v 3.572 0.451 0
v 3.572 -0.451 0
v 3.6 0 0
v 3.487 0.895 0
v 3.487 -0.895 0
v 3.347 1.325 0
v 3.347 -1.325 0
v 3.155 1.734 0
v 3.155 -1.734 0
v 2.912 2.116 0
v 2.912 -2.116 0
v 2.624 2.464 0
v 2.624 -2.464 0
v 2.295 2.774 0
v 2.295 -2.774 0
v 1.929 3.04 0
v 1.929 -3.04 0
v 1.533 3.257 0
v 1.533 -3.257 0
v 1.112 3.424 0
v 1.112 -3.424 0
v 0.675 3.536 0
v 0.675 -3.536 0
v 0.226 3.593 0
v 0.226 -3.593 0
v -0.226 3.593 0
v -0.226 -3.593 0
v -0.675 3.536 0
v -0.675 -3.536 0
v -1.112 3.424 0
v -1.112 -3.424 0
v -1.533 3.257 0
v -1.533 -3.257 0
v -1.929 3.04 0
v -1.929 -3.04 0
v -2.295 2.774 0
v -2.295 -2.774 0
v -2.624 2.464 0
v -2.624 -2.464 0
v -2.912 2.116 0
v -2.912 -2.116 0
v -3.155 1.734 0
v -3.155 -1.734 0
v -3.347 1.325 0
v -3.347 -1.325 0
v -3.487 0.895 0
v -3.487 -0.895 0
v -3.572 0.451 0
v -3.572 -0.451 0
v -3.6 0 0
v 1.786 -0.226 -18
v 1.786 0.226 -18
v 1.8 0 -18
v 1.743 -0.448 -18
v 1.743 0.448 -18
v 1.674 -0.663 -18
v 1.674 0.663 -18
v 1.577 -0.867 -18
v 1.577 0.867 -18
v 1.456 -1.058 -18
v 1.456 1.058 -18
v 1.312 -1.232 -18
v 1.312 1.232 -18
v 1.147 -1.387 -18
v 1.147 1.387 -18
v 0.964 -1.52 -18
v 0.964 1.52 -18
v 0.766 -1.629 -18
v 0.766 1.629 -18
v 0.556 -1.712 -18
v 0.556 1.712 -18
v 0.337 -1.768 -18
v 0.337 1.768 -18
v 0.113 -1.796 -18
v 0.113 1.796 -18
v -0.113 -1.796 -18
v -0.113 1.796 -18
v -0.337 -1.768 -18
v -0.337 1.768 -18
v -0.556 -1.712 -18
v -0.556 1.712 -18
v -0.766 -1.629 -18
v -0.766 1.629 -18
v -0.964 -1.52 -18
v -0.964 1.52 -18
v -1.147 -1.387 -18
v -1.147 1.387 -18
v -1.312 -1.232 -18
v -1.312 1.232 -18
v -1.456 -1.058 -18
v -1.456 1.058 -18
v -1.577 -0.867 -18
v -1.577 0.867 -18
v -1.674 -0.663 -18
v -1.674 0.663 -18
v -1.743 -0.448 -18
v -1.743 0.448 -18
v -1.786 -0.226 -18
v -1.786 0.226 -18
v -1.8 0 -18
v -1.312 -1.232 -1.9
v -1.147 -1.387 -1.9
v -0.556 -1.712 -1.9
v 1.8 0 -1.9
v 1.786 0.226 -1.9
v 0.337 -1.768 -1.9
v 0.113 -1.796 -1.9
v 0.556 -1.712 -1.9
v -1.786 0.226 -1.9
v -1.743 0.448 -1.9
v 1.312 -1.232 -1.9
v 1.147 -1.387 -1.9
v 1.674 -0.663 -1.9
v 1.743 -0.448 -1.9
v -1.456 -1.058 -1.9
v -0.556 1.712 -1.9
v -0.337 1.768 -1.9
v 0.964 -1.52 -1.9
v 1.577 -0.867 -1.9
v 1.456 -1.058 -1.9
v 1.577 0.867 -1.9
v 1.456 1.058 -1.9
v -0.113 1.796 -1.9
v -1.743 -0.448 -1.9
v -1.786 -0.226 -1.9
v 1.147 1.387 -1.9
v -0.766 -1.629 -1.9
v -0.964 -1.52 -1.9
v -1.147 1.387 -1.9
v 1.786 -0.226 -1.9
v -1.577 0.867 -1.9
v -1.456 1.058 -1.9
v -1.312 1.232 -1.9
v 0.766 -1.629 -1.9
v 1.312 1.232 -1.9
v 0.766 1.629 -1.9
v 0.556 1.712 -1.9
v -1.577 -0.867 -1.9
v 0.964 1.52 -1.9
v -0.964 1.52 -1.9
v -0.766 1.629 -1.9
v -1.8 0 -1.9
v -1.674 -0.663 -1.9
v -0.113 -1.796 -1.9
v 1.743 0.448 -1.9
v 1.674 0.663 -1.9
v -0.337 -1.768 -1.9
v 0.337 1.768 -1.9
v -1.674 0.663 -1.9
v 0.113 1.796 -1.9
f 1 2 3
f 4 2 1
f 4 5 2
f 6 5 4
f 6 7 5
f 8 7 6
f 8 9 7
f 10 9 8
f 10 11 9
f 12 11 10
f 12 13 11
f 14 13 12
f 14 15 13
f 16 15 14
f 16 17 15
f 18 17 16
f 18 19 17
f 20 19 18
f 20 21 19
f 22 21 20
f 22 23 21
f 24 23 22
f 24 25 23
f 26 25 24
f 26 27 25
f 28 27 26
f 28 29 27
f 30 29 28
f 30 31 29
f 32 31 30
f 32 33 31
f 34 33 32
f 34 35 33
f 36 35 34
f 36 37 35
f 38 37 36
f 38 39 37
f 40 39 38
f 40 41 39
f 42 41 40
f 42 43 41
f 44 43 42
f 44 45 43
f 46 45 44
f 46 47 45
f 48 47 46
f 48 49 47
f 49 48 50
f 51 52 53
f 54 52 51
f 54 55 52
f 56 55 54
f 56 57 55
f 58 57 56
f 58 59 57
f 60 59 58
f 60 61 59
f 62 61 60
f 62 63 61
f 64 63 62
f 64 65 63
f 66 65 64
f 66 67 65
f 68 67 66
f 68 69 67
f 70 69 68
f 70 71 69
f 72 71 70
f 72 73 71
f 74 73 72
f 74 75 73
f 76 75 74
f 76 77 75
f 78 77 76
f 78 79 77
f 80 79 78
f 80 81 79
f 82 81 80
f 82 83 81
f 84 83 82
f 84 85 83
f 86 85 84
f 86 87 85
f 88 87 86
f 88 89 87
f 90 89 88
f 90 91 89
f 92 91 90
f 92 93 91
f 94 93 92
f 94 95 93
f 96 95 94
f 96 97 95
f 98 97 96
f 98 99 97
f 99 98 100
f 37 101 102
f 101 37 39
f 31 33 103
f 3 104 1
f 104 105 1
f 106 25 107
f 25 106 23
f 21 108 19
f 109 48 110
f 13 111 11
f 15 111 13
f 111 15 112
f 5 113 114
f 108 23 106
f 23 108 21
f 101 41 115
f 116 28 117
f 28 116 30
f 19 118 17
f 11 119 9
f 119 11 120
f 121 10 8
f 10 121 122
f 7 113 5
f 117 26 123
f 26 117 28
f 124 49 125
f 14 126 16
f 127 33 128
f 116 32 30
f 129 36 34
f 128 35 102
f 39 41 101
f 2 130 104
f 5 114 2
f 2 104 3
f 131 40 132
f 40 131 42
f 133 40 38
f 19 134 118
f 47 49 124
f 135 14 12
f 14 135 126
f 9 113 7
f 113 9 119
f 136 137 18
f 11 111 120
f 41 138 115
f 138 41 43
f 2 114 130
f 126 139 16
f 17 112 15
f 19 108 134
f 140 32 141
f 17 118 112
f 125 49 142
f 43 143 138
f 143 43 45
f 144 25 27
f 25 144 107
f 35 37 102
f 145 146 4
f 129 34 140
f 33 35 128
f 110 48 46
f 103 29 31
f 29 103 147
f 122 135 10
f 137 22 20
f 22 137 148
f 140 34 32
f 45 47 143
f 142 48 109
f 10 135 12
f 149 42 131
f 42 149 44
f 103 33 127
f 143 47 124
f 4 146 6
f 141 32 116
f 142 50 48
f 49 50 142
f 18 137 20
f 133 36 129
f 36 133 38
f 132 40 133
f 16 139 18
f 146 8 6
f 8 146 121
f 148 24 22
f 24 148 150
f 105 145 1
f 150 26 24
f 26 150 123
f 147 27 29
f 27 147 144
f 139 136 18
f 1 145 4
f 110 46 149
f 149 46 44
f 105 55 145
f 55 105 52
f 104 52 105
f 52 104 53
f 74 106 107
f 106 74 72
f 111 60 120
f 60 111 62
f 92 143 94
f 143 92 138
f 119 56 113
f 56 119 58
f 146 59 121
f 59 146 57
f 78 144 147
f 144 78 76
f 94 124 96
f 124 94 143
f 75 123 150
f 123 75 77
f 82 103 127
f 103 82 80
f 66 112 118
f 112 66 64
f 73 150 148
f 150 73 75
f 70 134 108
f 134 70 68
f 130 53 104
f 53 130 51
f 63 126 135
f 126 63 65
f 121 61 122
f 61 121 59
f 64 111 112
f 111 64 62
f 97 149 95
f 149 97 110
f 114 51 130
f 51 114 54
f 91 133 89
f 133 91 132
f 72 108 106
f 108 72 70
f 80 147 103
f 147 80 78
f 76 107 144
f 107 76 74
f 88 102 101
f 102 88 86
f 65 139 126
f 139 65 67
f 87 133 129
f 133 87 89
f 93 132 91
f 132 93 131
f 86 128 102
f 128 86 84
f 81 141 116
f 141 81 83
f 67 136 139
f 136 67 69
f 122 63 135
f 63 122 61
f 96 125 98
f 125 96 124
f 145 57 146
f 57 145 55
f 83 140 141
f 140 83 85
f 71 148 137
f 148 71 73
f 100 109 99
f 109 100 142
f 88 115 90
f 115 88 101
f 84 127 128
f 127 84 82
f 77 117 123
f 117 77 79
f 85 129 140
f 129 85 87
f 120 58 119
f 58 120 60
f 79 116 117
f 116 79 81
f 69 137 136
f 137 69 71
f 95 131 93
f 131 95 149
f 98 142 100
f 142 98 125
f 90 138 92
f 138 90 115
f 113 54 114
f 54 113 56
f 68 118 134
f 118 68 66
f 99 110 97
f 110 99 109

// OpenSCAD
$fn = 50;


difference() {
	union() {
		translate(v = [0, 0, 0]) {
			rotate(a = [0, 0, 0]) {
				difference() {
					union() {
						translate(v = [0, 0, -18.0000000000]) {
							cylinder(h = 18, r = 1.5000000000);
						}
						translate(v = [0, 0, -1.9000000000]) {
							cylinder(h = 1.9000000000, r1 = 1.8000000000, r2 = 3.6000000000);
						}
						translate(v = [0, 0, -18.0000000000]) {
							cylinder(h = 18, r = 1.8000000000);
						}
						translate(v = [0, 0, -18.0000000000]) {
							cylinder(h = 18, r = 1.5000000000);
						}
					}
					union();
				}
			}
		}
	}
	union();
}
